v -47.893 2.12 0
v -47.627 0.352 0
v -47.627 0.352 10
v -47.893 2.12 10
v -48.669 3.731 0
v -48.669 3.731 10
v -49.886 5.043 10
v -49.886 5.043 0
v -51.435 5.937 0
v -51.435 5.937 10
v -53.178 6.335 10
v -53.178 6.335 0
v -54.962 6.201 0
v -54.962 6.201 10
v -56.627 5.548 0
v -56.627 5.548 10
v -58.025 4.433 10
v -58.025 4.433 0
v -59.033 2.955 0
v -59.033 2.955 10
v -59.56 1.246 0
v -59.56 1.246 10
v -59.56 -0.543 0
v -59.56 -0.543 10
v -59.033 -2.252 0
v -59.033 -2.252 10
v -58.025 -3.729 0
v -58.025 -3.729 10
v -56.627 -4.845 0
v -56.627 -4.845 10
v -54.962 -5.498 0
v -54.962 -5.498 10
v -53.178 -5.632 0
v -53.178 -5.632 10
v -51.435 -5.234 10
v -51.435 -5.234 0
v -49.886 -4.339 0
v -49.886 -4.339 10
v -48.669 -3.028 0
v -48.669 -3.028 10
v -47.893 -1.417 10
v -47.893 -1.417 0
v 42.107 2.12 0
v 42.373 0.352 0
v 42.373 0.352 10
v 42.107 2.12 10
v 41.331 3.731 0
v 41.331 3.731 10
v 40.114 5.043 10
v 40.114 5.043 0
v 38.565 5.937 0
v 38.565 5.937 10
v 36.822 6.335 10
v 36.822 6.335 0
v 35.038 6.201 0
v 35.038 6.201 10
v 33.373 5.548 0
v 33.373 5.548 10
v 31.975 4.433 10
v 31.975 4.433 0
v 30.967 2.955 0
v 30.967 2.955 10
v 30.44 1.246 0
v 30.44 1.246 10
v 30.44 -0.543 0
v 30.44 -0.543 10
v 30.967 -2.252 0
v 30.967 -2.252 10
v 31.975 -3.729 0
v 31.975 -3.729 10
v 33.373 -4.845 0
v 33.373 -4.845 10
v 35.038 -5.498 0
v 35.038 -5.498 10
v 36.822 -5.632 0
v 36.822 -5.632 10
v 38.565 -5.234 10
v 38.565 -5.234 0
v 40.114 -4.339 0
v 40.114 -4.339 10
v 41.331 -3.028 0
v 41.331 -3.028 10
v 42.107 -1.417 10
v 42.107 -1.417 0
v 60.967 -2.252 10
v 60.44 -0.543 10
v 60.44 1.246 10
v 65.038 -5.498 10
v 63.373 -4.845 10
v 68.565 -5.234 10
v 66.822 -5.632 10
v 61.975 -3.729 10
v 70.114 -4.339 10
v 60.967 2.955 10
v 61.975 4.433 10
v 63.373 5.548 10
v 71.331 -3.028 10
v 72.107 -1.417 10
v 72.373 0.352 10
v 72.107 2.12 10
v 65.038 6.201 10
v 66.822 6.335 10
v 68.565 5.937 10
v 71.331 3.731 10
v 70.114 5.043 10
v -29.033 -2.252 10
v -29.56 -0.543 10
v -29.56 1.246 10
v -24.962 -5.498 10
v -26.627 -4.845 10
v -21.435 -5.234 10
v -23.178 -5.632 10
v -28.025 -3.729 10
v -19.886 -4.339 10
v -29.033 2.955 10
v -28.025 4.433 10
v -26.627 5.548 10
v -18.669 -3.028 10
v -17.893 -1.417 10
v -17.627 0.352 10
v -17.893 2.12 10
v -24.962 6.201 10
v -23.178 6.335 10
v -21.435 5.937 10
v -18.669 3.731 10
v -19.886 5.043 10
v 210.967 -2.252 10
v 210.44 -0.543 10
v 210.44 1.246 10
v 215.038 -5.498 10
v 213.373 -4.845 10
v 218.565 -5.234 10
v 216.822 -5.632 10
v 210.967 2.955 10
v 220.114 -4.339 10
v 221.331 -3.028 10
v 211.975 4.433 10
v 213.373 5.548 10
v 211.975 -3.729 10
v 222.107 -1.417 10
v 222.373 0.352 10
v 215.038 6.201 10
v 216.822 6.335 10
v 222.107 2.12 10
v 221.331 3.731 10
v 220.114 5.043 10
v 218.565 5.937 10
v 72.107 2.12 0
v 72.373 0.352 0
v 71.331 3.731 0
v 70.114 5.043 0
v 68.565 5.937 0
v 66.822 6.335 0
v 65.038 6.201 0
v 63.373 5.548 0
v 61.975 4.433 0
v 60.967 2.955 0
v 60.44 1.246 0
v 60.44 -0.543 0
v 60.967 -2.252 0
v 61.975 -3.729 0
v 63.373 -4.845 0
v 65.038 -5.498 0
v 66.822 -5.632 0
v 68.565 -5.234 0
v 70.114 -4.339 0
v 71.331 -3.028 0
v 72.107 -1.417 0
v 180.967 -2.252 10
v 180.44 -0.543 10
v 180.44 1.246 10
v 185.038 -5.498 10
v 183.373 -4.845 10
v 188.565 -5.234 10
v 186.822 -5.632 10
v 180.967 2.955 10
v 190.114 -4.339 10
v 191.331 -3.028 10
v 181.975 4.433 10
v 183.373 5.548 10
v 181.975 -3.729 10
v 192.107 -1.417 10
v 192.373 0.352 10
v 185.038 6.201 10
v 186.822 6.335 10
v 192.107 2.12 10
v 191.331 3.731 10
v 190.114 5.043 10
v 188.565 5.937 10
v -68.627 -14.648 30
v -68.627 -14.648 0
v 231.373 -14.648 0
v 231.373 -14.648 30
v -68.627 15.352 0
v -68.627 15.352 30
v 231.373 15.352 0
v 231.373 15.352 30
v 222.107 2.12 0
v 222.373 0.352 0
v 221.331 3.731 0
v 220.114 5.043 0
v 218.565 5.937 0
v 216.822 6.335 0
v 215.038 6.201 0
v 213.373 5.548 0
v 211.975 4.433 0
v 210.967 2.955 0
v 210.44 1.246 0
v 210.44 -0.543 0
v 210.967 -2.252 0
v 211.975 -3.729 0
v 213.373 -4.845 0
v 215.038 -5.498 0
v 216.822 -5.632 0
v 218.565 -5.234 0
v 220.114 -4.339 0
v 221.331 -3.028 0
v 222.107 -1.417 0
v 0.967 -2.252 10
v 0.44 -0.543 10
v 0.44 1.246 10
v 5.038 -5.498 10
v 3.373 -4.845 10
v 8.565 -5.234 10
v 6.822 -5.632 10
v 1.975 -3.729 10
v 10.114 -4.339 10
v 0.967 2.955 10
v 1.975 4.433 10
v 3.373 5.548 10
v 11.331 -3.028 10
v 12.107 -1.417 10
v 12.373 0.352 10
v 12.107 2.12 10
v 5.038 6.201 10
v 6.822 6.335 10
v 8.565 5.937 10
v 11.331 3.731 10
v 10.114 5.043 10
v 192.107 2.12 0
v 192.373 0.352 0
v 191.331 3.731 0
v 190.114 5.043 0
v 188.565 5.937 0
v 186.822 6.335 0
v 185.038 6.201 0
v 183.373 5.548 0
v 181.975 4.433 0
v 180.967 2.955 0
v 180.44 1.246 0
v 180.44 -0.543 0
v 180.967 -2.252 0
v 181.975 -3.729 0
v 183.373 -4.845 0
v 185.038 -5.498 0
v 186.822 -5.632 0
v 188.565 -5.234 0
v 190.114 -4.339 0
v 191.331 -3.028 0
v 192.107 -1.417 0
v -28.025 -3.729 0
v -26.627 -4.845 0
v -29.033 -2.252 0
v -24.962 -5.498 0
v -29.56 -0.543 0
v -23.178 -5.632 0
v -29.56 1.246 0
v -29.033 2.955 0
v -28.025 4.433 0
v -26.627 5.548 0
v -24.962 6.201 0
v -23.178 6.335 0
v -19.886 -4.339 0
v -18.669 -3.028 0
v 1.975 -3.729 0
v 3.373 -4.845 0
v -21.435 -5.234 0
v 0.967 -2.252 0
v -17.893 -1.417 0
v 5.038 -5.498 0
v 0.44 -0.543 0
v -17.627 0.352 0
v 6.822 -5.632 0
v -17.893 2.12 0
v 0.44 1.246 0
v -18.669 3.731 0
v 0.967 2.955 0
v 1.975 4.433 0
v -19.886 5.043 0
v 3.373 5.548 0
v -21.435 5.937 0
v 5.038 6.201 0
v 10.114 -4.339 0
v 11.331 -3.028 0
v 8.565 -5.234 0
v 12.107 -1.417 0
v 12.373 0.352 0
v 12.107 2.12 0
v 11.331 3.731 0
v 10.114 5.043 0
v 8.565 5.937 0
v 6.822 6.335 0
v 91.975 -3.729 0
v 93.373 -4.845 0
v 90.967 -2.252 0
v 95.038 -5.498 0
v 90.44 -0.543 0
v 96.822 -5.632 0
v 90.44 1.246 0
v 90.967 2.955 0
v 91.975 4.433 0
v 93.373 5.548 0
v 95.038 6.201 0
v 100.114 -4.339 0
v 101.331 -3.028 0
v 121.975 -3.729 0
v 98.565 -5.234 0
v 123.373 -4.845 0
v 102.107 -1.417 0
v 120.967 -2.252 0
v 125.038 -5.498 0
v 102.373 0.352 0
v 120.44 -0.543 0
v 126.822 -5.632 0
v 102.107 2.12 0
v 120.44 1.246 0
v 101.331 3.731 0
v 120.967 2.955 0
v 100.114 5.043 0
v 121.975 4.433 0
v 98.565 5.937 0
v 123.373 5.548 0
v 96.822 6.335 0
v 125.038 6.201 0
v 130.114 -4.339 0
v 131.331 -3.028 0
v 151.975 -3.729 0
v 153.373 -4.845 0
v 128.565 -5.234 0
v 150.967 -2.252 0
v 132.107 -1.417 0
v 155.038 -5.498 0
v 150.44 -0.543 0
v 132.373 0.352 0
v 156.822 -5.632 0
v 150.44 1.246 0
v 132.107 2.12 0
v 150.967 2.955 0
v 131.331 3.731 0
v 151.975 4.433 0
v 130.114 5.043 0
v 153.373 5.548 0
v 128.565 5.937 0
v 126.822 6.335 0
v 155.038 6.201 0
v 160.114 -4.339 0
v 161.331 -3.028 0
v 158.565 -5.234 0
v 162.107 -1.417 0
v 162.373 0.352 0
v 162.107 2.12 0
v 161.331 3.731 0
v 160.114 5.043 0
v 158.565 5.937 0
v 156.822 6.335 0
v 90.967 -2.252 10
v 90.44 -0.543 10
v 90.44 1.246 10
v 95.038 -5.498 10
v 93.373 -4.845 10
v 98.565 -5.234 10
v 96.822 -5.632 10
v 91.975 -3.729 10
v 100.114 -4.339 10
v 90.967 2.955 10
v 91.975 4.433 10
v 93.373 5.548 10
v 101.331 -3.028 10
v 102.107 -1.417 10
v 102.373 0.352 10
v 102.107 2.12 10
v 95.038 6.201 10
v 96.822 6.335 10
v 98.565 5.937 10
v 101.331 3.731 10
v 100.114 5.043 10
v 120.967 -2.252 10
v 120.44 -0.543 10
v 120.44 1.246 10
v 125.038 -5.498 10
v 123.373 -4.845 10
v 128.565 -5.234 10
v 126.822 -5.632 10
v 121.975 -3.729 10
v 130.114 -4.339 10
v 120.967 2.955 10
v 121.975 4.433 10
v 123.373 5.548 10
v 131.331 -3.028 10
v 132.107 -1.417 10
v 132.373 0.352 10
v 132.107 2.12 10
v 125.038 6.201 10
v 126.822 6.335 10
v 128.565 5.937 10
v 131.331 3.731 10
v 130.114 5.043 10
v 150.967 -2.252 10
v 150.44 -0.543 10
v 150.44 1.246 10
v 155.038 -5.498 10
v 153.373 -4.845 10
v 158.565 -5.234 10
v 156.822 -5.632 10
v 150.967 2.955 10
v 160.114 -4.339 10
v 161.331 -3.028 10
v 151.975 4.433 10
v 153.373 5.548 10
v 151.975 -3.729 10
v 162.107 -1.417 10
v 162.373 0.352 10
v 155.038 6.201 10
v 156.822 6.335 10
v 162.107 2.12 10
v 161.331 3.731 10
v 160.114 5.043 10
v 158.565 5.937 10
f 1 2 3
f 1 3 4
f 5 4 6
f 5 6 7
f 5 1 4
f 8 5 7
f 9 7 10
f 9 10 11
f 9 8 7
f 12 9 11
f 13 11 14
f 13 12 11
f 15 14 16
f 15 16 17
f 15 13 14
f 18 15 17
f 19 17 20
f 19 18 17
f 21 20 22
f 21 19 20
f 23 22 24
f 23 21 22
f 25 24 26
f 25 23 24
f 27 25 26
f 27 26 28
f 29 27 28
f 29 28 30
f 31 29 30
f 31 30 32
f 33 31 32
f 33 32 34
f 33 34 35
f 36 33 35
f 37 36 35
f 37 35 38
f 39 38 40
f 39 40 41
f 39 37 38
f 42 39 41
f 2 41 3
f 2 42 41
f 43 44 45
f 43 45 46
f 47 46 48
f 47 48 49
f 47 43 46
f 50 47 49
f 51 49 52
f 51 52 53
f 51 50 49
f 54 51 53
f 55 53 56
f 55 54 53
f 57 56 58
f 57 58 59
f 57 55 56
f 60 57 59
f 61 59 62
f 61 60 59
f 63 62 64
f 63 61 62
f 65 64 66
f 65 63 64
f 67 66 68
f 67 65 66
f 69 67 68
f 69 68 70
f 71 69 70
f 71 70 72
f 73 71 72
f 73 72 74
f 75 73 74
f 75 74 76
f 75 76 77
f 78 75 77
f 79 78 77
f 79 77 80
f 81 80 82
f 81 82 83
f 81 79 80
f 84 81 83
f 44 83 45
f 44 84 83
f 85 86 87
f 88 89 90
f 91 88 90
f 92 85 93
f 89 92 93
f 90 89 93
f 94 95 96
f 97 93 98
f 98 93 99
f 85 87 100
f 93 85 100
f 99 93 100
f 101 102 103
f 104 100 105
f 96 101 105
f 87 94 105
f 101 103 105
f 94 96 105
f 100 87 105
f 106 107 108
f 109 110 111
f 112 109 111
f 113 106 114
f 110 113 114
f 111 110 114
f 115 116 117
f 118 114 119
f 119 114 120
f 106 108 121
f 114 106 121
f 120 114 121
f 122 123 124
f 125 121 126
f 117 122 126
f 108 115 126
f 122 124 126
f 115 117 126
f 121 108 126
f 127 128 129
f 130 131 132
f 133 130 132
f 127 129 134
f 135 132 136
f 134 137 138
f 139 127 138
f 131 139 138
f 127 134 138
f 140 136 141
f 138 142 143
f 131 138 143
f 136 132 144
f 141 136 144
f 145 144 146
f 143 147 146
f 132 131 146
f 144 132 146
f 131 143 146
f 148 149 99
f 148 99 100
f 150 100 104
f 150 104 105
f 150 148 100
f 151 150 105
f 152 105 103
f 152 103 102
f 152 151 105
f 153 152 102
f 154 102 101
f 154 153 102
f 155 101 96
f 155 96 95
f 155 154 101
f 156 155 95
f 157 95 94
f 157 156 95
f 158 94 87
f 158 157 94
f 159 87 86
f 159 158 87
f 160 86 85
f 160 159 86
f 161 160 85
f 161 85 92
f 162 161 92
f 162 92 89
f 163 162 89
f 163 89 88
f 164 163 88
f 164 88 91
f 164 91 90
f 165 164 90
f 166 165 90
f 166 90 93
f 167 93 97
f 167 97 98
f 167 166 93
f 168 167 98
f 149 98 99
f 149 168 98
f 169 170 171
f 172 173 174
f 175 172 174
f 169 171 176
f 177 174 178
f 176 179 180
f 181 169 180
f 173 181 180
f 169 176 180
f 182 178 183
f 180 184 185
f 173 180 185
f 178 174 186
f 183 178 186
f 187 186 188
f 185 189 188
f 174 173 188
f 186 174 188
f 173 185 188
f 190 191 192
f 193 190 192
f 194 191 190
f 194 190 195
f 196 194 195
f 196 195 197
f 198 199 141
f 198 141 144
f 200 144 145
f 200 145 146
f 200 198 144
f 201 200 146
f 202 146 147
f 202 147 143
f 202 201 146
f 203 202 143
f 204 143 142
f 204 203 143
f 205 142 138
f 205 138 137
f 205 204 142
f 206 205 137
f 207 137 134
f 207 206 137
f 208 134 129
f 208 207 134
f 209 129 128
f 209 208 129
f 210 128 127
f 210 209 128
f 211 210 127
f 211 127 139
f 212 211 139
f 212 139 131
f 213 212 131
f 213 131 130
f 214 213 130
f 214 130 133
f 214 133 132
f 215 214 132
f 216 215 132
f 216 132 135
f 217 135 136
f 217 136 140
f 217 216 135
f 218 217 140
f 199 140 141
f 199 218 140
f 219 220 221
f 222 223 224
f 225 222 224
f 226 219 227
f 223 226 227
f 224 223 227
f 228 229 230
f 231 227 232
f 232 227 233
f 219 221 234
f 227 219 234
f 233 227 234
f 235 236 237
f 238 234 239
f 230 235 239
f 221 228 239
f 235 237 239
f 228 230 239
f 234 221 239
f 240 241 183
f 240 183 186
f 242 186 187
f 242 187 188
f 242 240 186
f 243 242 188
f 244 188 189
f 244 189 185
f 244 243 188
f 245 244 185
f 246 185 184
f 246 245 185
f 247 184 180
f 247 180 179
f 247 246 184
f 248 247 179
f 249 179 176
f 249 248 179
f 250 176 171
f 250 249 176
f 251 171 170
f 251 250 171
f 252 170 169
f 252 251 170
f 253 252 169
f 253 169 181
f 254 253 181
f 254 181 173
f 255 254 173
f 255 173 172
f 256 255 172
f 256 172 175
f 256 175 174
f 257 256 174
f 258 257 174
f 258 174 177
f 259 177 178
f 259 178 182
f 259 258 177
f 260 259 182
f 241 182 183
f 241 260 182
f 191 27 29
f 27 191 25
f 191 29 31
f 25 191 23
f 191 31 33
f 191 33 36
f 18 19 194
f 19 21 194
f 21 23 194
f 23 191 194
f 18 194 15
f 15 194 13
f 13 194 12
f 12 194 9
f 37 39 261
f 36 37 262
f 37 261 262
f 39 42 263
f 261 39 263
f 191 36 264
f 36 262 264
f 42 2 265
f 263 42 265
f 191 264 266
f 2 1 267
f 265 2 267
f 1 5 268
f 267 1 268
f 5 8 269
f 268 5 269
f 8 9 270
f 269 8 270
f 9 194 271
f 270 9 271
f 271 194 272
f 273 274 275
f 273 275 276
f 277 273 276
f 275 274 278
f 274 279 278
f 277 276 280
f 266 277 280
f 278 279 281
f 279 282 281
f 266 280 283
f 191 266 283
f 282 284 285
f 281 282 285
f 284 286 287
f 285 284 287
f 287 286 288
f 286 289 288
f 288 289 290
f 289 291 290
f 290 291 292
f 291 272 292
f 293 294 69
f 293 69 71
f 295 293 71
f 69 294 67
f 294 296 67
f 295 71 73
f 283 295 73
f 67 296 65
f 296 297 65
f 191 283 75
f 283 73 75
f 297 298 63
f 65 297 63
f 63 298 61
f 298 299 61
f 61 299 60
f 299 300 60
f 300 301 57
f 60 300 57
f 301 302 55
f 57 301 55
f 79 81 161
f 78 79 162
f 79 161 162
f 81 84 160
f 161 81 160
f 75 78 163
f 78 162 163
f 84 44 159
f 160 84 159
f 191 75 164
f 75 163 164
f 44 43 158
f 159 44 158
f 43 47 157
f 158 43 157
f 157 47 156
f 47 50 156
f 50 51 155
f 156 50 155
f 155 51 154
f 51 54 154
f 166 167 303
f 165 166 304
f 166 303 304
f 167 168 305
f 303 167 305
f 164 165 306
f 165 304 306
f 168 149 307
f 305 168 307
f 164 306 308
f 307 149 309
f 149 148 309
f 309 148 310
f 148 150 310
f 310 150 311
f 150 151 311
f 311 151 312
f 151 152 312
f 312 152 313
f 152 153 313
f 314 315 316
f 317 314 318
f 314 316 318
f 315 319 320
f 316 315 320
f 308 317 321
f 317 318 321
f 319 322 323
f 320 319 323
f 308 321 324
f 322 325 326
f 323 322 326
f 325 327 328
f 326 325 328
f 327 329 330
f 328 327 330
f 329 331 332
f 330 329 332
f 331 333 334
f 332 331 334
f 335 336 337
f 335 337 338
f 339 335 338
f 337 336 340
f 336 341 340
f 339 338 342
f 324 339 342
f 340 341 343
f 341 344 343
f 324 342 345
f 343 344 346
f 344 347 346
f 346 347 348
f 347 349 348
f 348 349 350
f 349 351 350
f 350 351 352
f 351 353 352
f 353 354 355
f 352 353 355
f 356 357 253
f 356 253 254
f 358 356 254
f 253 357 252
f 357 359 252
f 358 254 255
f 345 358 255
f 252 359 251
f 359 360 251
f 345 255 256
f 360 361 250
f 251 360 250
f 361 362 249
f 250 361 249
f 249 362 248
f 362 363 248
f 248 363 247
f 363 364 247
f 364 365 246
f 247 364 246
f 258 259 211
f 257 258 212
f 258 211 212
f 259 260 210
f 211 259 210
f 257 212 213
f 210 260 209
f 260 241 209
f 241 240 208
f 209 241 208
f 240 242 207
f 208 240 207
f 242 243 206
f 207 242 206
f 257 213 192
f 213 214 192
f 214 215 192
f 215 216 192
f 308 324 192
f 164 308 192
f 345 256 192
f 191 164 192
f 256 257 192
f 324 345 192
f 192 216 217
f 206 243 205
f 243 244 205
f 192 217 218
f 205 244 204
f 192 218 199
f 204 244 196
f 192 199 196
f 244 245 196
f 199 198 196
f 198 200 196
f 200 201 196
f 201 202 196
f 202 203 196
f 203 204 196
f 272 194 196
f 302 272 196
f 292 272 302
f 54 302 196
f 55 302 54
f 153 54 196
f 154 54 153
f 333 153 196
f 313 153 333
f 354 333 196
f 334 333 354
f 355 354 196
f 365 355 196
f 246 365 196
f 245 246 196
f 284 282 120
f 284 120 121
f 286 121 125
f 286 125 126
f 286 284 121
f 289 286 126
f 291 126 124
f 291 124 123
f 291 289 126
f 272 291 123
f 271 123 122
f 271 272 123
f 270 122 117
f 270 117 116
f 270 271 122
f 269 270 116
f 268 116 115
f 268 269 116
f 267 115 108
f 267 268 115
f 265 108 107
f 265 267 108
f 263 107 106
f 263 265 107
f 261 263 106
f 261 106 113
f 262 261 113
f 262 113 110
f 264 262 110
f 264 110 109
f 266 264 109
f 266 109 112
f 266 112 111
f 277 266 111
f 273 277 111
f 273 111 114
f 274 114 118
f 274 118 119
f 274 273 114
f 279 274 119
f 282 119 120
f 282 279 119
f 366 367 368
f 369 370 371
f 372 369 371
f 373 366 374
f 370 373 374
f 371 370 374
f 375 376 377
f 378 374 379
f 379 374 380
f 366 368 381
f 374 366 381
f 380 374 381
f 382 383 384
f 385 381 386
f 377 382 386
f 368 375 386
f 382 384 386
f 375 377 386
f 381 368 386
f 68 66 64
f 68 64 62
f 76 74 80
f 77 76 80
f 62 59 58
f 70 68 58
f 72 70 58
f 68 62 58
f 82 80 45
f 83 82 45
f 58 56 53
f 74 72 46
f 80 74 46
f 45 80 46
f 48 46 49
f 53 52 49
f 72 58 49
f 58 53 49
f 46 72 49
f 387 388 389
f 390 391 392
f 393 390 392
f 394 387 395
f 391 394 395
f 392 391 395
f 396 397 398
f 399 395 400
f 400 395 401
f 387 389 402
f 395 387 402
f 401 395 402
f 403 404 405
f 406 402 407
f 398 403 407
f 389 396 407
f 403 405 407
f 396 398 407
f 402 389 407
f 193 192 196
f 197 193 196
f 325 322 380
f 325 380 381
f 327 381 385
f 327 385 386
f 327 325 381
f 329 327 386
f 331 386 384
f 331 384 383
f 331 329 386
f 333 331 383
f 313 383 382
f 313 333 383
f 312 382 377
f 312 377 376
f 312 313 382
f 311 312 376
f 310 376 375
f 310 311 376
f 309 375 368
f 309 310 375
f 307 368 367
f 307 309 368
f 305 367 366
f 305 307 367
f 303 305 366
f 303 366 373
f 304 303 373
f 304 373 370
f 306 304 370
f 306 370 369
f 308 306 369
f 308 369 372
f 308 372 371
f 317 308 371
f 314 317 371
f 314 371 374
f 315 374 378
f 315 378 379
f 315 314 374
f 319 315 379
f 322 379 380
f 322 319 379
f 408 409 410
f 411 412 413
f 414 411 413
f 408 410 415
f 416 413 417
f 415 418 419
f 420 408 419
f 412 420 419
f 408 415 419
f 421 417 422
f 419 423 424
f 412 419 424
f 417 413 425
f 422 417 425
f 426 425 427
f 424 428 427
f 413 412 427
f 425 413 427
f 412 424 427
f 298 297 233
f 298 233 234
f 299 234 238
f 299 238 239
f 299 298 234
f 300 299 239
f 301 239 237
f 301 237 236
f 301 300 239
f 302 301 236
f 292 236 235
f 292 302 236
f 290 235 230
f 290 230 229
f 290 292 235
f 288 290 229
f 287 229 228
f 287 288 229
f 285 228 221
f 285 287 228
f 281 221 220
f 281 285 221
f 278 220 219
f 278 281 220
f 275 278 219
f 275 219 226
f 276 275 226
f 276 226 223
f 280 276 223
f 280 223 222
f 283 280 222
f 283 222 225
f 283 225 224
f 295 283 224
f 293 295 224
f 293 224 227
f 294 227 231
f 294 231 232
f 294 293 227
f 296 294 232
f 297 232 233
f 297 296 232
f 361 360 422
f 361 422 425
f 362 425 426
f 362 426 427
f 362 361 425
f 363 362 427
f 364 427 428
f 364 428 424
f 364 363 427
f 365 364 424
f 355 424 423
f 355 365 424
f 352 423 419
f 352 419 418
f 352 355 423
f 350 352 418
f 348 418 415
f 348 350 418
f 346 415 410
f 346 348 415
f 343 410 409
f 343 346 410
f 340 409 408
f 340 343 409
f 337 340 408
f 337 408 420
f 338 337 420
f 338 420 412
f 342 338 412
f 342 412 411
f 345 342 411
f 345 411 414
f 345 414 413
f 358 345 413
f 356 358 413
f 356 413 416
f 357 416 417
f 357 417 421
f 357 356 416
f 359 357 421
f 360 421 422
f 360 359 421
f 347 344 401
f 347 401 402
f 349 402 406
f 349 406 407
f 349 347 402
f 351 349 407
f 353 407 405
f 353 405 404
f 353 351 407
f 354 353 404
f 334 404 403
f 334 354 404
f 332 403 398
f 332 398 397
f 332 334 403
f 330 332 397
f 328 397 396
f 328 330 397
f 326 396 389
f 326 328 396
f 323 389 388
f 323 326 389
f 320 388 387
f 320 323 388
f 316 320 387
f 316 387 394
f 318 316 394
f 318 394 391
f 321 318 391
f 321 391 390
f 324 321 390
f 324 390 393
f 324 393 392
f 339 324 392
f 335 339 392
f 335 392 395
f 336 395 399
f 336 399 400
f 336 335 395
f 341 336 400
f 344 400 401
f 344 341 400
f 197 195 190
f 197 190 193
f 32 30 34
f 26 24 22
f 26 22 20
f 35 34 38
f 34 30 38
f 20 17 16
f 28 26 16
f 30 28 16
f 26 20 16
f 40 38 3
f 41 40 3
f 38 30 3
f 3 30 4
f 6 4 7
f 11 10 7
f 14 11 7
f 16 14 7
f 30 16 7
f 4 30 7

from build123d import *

# Parameters (mm, degrees)
ESQUISSE1_W             = 300
ESQUISSE1_H             = 30
BOSS_EXTRU_4_DEPTH      = 30
ESQUISSE3_R             = 6
ENL_V_MAT_EXTRU_1_DEPTH = 10


with BuildPart() as part:
    # Esquisse1 → Boss.-Extru.4 (new body)
    with BuildSketch(Plane.XY):
        with Locations((81.373258024, 0.3515625)):
            Rectangle(ESQUISSE1_W, ESQUISSE1_H)
    extrude(amount=BOSS_EXTRU_4_DEPTH)

    # Esquisse3 → Enlèv. mat.-Extru.1 (cut)
    with BuildSketch(Plane.XY):
        with Locations((-53.626741976, 0.3515625)):
            Circle(ESQUISSE3_R)
        with Locations((-23.626741976, 0.3515625)):
            Circle(ESQUISSE3_R)
        with Locations((6.373258024, 0.3515625)):
            Circle(ESQUISSE3_R)
        with Locations((36.373258024, 0.3515625)):
            Circle(ESQUISSE3_R)
        with Locations((66.373258024, 0.3515625)):
            Circle(ESQUISSE3_R)
        with Locations((96.373258024, 0.3515625)):
            Circle(ESQUISSE3_R)
        with Locations((126.373258024, 0.3515625)):
            Circle(ESQUISSE3_R)
        with Locations((156.373258024, 0.3515625)):
            Circle(ESQUISSE3_R)
        with Locations((186.373258024, 0.3515625)):
            Circle(ESQUISSE3_R)
        with Locations((216.373258024, 0.3515625)):
            Circle(ESQUISSE3_R)
    extrude(amount=ENL_V_MAT_EXTRU_1_DEPTH, mode=Mode.SUBTRACT)


solid = part.part
